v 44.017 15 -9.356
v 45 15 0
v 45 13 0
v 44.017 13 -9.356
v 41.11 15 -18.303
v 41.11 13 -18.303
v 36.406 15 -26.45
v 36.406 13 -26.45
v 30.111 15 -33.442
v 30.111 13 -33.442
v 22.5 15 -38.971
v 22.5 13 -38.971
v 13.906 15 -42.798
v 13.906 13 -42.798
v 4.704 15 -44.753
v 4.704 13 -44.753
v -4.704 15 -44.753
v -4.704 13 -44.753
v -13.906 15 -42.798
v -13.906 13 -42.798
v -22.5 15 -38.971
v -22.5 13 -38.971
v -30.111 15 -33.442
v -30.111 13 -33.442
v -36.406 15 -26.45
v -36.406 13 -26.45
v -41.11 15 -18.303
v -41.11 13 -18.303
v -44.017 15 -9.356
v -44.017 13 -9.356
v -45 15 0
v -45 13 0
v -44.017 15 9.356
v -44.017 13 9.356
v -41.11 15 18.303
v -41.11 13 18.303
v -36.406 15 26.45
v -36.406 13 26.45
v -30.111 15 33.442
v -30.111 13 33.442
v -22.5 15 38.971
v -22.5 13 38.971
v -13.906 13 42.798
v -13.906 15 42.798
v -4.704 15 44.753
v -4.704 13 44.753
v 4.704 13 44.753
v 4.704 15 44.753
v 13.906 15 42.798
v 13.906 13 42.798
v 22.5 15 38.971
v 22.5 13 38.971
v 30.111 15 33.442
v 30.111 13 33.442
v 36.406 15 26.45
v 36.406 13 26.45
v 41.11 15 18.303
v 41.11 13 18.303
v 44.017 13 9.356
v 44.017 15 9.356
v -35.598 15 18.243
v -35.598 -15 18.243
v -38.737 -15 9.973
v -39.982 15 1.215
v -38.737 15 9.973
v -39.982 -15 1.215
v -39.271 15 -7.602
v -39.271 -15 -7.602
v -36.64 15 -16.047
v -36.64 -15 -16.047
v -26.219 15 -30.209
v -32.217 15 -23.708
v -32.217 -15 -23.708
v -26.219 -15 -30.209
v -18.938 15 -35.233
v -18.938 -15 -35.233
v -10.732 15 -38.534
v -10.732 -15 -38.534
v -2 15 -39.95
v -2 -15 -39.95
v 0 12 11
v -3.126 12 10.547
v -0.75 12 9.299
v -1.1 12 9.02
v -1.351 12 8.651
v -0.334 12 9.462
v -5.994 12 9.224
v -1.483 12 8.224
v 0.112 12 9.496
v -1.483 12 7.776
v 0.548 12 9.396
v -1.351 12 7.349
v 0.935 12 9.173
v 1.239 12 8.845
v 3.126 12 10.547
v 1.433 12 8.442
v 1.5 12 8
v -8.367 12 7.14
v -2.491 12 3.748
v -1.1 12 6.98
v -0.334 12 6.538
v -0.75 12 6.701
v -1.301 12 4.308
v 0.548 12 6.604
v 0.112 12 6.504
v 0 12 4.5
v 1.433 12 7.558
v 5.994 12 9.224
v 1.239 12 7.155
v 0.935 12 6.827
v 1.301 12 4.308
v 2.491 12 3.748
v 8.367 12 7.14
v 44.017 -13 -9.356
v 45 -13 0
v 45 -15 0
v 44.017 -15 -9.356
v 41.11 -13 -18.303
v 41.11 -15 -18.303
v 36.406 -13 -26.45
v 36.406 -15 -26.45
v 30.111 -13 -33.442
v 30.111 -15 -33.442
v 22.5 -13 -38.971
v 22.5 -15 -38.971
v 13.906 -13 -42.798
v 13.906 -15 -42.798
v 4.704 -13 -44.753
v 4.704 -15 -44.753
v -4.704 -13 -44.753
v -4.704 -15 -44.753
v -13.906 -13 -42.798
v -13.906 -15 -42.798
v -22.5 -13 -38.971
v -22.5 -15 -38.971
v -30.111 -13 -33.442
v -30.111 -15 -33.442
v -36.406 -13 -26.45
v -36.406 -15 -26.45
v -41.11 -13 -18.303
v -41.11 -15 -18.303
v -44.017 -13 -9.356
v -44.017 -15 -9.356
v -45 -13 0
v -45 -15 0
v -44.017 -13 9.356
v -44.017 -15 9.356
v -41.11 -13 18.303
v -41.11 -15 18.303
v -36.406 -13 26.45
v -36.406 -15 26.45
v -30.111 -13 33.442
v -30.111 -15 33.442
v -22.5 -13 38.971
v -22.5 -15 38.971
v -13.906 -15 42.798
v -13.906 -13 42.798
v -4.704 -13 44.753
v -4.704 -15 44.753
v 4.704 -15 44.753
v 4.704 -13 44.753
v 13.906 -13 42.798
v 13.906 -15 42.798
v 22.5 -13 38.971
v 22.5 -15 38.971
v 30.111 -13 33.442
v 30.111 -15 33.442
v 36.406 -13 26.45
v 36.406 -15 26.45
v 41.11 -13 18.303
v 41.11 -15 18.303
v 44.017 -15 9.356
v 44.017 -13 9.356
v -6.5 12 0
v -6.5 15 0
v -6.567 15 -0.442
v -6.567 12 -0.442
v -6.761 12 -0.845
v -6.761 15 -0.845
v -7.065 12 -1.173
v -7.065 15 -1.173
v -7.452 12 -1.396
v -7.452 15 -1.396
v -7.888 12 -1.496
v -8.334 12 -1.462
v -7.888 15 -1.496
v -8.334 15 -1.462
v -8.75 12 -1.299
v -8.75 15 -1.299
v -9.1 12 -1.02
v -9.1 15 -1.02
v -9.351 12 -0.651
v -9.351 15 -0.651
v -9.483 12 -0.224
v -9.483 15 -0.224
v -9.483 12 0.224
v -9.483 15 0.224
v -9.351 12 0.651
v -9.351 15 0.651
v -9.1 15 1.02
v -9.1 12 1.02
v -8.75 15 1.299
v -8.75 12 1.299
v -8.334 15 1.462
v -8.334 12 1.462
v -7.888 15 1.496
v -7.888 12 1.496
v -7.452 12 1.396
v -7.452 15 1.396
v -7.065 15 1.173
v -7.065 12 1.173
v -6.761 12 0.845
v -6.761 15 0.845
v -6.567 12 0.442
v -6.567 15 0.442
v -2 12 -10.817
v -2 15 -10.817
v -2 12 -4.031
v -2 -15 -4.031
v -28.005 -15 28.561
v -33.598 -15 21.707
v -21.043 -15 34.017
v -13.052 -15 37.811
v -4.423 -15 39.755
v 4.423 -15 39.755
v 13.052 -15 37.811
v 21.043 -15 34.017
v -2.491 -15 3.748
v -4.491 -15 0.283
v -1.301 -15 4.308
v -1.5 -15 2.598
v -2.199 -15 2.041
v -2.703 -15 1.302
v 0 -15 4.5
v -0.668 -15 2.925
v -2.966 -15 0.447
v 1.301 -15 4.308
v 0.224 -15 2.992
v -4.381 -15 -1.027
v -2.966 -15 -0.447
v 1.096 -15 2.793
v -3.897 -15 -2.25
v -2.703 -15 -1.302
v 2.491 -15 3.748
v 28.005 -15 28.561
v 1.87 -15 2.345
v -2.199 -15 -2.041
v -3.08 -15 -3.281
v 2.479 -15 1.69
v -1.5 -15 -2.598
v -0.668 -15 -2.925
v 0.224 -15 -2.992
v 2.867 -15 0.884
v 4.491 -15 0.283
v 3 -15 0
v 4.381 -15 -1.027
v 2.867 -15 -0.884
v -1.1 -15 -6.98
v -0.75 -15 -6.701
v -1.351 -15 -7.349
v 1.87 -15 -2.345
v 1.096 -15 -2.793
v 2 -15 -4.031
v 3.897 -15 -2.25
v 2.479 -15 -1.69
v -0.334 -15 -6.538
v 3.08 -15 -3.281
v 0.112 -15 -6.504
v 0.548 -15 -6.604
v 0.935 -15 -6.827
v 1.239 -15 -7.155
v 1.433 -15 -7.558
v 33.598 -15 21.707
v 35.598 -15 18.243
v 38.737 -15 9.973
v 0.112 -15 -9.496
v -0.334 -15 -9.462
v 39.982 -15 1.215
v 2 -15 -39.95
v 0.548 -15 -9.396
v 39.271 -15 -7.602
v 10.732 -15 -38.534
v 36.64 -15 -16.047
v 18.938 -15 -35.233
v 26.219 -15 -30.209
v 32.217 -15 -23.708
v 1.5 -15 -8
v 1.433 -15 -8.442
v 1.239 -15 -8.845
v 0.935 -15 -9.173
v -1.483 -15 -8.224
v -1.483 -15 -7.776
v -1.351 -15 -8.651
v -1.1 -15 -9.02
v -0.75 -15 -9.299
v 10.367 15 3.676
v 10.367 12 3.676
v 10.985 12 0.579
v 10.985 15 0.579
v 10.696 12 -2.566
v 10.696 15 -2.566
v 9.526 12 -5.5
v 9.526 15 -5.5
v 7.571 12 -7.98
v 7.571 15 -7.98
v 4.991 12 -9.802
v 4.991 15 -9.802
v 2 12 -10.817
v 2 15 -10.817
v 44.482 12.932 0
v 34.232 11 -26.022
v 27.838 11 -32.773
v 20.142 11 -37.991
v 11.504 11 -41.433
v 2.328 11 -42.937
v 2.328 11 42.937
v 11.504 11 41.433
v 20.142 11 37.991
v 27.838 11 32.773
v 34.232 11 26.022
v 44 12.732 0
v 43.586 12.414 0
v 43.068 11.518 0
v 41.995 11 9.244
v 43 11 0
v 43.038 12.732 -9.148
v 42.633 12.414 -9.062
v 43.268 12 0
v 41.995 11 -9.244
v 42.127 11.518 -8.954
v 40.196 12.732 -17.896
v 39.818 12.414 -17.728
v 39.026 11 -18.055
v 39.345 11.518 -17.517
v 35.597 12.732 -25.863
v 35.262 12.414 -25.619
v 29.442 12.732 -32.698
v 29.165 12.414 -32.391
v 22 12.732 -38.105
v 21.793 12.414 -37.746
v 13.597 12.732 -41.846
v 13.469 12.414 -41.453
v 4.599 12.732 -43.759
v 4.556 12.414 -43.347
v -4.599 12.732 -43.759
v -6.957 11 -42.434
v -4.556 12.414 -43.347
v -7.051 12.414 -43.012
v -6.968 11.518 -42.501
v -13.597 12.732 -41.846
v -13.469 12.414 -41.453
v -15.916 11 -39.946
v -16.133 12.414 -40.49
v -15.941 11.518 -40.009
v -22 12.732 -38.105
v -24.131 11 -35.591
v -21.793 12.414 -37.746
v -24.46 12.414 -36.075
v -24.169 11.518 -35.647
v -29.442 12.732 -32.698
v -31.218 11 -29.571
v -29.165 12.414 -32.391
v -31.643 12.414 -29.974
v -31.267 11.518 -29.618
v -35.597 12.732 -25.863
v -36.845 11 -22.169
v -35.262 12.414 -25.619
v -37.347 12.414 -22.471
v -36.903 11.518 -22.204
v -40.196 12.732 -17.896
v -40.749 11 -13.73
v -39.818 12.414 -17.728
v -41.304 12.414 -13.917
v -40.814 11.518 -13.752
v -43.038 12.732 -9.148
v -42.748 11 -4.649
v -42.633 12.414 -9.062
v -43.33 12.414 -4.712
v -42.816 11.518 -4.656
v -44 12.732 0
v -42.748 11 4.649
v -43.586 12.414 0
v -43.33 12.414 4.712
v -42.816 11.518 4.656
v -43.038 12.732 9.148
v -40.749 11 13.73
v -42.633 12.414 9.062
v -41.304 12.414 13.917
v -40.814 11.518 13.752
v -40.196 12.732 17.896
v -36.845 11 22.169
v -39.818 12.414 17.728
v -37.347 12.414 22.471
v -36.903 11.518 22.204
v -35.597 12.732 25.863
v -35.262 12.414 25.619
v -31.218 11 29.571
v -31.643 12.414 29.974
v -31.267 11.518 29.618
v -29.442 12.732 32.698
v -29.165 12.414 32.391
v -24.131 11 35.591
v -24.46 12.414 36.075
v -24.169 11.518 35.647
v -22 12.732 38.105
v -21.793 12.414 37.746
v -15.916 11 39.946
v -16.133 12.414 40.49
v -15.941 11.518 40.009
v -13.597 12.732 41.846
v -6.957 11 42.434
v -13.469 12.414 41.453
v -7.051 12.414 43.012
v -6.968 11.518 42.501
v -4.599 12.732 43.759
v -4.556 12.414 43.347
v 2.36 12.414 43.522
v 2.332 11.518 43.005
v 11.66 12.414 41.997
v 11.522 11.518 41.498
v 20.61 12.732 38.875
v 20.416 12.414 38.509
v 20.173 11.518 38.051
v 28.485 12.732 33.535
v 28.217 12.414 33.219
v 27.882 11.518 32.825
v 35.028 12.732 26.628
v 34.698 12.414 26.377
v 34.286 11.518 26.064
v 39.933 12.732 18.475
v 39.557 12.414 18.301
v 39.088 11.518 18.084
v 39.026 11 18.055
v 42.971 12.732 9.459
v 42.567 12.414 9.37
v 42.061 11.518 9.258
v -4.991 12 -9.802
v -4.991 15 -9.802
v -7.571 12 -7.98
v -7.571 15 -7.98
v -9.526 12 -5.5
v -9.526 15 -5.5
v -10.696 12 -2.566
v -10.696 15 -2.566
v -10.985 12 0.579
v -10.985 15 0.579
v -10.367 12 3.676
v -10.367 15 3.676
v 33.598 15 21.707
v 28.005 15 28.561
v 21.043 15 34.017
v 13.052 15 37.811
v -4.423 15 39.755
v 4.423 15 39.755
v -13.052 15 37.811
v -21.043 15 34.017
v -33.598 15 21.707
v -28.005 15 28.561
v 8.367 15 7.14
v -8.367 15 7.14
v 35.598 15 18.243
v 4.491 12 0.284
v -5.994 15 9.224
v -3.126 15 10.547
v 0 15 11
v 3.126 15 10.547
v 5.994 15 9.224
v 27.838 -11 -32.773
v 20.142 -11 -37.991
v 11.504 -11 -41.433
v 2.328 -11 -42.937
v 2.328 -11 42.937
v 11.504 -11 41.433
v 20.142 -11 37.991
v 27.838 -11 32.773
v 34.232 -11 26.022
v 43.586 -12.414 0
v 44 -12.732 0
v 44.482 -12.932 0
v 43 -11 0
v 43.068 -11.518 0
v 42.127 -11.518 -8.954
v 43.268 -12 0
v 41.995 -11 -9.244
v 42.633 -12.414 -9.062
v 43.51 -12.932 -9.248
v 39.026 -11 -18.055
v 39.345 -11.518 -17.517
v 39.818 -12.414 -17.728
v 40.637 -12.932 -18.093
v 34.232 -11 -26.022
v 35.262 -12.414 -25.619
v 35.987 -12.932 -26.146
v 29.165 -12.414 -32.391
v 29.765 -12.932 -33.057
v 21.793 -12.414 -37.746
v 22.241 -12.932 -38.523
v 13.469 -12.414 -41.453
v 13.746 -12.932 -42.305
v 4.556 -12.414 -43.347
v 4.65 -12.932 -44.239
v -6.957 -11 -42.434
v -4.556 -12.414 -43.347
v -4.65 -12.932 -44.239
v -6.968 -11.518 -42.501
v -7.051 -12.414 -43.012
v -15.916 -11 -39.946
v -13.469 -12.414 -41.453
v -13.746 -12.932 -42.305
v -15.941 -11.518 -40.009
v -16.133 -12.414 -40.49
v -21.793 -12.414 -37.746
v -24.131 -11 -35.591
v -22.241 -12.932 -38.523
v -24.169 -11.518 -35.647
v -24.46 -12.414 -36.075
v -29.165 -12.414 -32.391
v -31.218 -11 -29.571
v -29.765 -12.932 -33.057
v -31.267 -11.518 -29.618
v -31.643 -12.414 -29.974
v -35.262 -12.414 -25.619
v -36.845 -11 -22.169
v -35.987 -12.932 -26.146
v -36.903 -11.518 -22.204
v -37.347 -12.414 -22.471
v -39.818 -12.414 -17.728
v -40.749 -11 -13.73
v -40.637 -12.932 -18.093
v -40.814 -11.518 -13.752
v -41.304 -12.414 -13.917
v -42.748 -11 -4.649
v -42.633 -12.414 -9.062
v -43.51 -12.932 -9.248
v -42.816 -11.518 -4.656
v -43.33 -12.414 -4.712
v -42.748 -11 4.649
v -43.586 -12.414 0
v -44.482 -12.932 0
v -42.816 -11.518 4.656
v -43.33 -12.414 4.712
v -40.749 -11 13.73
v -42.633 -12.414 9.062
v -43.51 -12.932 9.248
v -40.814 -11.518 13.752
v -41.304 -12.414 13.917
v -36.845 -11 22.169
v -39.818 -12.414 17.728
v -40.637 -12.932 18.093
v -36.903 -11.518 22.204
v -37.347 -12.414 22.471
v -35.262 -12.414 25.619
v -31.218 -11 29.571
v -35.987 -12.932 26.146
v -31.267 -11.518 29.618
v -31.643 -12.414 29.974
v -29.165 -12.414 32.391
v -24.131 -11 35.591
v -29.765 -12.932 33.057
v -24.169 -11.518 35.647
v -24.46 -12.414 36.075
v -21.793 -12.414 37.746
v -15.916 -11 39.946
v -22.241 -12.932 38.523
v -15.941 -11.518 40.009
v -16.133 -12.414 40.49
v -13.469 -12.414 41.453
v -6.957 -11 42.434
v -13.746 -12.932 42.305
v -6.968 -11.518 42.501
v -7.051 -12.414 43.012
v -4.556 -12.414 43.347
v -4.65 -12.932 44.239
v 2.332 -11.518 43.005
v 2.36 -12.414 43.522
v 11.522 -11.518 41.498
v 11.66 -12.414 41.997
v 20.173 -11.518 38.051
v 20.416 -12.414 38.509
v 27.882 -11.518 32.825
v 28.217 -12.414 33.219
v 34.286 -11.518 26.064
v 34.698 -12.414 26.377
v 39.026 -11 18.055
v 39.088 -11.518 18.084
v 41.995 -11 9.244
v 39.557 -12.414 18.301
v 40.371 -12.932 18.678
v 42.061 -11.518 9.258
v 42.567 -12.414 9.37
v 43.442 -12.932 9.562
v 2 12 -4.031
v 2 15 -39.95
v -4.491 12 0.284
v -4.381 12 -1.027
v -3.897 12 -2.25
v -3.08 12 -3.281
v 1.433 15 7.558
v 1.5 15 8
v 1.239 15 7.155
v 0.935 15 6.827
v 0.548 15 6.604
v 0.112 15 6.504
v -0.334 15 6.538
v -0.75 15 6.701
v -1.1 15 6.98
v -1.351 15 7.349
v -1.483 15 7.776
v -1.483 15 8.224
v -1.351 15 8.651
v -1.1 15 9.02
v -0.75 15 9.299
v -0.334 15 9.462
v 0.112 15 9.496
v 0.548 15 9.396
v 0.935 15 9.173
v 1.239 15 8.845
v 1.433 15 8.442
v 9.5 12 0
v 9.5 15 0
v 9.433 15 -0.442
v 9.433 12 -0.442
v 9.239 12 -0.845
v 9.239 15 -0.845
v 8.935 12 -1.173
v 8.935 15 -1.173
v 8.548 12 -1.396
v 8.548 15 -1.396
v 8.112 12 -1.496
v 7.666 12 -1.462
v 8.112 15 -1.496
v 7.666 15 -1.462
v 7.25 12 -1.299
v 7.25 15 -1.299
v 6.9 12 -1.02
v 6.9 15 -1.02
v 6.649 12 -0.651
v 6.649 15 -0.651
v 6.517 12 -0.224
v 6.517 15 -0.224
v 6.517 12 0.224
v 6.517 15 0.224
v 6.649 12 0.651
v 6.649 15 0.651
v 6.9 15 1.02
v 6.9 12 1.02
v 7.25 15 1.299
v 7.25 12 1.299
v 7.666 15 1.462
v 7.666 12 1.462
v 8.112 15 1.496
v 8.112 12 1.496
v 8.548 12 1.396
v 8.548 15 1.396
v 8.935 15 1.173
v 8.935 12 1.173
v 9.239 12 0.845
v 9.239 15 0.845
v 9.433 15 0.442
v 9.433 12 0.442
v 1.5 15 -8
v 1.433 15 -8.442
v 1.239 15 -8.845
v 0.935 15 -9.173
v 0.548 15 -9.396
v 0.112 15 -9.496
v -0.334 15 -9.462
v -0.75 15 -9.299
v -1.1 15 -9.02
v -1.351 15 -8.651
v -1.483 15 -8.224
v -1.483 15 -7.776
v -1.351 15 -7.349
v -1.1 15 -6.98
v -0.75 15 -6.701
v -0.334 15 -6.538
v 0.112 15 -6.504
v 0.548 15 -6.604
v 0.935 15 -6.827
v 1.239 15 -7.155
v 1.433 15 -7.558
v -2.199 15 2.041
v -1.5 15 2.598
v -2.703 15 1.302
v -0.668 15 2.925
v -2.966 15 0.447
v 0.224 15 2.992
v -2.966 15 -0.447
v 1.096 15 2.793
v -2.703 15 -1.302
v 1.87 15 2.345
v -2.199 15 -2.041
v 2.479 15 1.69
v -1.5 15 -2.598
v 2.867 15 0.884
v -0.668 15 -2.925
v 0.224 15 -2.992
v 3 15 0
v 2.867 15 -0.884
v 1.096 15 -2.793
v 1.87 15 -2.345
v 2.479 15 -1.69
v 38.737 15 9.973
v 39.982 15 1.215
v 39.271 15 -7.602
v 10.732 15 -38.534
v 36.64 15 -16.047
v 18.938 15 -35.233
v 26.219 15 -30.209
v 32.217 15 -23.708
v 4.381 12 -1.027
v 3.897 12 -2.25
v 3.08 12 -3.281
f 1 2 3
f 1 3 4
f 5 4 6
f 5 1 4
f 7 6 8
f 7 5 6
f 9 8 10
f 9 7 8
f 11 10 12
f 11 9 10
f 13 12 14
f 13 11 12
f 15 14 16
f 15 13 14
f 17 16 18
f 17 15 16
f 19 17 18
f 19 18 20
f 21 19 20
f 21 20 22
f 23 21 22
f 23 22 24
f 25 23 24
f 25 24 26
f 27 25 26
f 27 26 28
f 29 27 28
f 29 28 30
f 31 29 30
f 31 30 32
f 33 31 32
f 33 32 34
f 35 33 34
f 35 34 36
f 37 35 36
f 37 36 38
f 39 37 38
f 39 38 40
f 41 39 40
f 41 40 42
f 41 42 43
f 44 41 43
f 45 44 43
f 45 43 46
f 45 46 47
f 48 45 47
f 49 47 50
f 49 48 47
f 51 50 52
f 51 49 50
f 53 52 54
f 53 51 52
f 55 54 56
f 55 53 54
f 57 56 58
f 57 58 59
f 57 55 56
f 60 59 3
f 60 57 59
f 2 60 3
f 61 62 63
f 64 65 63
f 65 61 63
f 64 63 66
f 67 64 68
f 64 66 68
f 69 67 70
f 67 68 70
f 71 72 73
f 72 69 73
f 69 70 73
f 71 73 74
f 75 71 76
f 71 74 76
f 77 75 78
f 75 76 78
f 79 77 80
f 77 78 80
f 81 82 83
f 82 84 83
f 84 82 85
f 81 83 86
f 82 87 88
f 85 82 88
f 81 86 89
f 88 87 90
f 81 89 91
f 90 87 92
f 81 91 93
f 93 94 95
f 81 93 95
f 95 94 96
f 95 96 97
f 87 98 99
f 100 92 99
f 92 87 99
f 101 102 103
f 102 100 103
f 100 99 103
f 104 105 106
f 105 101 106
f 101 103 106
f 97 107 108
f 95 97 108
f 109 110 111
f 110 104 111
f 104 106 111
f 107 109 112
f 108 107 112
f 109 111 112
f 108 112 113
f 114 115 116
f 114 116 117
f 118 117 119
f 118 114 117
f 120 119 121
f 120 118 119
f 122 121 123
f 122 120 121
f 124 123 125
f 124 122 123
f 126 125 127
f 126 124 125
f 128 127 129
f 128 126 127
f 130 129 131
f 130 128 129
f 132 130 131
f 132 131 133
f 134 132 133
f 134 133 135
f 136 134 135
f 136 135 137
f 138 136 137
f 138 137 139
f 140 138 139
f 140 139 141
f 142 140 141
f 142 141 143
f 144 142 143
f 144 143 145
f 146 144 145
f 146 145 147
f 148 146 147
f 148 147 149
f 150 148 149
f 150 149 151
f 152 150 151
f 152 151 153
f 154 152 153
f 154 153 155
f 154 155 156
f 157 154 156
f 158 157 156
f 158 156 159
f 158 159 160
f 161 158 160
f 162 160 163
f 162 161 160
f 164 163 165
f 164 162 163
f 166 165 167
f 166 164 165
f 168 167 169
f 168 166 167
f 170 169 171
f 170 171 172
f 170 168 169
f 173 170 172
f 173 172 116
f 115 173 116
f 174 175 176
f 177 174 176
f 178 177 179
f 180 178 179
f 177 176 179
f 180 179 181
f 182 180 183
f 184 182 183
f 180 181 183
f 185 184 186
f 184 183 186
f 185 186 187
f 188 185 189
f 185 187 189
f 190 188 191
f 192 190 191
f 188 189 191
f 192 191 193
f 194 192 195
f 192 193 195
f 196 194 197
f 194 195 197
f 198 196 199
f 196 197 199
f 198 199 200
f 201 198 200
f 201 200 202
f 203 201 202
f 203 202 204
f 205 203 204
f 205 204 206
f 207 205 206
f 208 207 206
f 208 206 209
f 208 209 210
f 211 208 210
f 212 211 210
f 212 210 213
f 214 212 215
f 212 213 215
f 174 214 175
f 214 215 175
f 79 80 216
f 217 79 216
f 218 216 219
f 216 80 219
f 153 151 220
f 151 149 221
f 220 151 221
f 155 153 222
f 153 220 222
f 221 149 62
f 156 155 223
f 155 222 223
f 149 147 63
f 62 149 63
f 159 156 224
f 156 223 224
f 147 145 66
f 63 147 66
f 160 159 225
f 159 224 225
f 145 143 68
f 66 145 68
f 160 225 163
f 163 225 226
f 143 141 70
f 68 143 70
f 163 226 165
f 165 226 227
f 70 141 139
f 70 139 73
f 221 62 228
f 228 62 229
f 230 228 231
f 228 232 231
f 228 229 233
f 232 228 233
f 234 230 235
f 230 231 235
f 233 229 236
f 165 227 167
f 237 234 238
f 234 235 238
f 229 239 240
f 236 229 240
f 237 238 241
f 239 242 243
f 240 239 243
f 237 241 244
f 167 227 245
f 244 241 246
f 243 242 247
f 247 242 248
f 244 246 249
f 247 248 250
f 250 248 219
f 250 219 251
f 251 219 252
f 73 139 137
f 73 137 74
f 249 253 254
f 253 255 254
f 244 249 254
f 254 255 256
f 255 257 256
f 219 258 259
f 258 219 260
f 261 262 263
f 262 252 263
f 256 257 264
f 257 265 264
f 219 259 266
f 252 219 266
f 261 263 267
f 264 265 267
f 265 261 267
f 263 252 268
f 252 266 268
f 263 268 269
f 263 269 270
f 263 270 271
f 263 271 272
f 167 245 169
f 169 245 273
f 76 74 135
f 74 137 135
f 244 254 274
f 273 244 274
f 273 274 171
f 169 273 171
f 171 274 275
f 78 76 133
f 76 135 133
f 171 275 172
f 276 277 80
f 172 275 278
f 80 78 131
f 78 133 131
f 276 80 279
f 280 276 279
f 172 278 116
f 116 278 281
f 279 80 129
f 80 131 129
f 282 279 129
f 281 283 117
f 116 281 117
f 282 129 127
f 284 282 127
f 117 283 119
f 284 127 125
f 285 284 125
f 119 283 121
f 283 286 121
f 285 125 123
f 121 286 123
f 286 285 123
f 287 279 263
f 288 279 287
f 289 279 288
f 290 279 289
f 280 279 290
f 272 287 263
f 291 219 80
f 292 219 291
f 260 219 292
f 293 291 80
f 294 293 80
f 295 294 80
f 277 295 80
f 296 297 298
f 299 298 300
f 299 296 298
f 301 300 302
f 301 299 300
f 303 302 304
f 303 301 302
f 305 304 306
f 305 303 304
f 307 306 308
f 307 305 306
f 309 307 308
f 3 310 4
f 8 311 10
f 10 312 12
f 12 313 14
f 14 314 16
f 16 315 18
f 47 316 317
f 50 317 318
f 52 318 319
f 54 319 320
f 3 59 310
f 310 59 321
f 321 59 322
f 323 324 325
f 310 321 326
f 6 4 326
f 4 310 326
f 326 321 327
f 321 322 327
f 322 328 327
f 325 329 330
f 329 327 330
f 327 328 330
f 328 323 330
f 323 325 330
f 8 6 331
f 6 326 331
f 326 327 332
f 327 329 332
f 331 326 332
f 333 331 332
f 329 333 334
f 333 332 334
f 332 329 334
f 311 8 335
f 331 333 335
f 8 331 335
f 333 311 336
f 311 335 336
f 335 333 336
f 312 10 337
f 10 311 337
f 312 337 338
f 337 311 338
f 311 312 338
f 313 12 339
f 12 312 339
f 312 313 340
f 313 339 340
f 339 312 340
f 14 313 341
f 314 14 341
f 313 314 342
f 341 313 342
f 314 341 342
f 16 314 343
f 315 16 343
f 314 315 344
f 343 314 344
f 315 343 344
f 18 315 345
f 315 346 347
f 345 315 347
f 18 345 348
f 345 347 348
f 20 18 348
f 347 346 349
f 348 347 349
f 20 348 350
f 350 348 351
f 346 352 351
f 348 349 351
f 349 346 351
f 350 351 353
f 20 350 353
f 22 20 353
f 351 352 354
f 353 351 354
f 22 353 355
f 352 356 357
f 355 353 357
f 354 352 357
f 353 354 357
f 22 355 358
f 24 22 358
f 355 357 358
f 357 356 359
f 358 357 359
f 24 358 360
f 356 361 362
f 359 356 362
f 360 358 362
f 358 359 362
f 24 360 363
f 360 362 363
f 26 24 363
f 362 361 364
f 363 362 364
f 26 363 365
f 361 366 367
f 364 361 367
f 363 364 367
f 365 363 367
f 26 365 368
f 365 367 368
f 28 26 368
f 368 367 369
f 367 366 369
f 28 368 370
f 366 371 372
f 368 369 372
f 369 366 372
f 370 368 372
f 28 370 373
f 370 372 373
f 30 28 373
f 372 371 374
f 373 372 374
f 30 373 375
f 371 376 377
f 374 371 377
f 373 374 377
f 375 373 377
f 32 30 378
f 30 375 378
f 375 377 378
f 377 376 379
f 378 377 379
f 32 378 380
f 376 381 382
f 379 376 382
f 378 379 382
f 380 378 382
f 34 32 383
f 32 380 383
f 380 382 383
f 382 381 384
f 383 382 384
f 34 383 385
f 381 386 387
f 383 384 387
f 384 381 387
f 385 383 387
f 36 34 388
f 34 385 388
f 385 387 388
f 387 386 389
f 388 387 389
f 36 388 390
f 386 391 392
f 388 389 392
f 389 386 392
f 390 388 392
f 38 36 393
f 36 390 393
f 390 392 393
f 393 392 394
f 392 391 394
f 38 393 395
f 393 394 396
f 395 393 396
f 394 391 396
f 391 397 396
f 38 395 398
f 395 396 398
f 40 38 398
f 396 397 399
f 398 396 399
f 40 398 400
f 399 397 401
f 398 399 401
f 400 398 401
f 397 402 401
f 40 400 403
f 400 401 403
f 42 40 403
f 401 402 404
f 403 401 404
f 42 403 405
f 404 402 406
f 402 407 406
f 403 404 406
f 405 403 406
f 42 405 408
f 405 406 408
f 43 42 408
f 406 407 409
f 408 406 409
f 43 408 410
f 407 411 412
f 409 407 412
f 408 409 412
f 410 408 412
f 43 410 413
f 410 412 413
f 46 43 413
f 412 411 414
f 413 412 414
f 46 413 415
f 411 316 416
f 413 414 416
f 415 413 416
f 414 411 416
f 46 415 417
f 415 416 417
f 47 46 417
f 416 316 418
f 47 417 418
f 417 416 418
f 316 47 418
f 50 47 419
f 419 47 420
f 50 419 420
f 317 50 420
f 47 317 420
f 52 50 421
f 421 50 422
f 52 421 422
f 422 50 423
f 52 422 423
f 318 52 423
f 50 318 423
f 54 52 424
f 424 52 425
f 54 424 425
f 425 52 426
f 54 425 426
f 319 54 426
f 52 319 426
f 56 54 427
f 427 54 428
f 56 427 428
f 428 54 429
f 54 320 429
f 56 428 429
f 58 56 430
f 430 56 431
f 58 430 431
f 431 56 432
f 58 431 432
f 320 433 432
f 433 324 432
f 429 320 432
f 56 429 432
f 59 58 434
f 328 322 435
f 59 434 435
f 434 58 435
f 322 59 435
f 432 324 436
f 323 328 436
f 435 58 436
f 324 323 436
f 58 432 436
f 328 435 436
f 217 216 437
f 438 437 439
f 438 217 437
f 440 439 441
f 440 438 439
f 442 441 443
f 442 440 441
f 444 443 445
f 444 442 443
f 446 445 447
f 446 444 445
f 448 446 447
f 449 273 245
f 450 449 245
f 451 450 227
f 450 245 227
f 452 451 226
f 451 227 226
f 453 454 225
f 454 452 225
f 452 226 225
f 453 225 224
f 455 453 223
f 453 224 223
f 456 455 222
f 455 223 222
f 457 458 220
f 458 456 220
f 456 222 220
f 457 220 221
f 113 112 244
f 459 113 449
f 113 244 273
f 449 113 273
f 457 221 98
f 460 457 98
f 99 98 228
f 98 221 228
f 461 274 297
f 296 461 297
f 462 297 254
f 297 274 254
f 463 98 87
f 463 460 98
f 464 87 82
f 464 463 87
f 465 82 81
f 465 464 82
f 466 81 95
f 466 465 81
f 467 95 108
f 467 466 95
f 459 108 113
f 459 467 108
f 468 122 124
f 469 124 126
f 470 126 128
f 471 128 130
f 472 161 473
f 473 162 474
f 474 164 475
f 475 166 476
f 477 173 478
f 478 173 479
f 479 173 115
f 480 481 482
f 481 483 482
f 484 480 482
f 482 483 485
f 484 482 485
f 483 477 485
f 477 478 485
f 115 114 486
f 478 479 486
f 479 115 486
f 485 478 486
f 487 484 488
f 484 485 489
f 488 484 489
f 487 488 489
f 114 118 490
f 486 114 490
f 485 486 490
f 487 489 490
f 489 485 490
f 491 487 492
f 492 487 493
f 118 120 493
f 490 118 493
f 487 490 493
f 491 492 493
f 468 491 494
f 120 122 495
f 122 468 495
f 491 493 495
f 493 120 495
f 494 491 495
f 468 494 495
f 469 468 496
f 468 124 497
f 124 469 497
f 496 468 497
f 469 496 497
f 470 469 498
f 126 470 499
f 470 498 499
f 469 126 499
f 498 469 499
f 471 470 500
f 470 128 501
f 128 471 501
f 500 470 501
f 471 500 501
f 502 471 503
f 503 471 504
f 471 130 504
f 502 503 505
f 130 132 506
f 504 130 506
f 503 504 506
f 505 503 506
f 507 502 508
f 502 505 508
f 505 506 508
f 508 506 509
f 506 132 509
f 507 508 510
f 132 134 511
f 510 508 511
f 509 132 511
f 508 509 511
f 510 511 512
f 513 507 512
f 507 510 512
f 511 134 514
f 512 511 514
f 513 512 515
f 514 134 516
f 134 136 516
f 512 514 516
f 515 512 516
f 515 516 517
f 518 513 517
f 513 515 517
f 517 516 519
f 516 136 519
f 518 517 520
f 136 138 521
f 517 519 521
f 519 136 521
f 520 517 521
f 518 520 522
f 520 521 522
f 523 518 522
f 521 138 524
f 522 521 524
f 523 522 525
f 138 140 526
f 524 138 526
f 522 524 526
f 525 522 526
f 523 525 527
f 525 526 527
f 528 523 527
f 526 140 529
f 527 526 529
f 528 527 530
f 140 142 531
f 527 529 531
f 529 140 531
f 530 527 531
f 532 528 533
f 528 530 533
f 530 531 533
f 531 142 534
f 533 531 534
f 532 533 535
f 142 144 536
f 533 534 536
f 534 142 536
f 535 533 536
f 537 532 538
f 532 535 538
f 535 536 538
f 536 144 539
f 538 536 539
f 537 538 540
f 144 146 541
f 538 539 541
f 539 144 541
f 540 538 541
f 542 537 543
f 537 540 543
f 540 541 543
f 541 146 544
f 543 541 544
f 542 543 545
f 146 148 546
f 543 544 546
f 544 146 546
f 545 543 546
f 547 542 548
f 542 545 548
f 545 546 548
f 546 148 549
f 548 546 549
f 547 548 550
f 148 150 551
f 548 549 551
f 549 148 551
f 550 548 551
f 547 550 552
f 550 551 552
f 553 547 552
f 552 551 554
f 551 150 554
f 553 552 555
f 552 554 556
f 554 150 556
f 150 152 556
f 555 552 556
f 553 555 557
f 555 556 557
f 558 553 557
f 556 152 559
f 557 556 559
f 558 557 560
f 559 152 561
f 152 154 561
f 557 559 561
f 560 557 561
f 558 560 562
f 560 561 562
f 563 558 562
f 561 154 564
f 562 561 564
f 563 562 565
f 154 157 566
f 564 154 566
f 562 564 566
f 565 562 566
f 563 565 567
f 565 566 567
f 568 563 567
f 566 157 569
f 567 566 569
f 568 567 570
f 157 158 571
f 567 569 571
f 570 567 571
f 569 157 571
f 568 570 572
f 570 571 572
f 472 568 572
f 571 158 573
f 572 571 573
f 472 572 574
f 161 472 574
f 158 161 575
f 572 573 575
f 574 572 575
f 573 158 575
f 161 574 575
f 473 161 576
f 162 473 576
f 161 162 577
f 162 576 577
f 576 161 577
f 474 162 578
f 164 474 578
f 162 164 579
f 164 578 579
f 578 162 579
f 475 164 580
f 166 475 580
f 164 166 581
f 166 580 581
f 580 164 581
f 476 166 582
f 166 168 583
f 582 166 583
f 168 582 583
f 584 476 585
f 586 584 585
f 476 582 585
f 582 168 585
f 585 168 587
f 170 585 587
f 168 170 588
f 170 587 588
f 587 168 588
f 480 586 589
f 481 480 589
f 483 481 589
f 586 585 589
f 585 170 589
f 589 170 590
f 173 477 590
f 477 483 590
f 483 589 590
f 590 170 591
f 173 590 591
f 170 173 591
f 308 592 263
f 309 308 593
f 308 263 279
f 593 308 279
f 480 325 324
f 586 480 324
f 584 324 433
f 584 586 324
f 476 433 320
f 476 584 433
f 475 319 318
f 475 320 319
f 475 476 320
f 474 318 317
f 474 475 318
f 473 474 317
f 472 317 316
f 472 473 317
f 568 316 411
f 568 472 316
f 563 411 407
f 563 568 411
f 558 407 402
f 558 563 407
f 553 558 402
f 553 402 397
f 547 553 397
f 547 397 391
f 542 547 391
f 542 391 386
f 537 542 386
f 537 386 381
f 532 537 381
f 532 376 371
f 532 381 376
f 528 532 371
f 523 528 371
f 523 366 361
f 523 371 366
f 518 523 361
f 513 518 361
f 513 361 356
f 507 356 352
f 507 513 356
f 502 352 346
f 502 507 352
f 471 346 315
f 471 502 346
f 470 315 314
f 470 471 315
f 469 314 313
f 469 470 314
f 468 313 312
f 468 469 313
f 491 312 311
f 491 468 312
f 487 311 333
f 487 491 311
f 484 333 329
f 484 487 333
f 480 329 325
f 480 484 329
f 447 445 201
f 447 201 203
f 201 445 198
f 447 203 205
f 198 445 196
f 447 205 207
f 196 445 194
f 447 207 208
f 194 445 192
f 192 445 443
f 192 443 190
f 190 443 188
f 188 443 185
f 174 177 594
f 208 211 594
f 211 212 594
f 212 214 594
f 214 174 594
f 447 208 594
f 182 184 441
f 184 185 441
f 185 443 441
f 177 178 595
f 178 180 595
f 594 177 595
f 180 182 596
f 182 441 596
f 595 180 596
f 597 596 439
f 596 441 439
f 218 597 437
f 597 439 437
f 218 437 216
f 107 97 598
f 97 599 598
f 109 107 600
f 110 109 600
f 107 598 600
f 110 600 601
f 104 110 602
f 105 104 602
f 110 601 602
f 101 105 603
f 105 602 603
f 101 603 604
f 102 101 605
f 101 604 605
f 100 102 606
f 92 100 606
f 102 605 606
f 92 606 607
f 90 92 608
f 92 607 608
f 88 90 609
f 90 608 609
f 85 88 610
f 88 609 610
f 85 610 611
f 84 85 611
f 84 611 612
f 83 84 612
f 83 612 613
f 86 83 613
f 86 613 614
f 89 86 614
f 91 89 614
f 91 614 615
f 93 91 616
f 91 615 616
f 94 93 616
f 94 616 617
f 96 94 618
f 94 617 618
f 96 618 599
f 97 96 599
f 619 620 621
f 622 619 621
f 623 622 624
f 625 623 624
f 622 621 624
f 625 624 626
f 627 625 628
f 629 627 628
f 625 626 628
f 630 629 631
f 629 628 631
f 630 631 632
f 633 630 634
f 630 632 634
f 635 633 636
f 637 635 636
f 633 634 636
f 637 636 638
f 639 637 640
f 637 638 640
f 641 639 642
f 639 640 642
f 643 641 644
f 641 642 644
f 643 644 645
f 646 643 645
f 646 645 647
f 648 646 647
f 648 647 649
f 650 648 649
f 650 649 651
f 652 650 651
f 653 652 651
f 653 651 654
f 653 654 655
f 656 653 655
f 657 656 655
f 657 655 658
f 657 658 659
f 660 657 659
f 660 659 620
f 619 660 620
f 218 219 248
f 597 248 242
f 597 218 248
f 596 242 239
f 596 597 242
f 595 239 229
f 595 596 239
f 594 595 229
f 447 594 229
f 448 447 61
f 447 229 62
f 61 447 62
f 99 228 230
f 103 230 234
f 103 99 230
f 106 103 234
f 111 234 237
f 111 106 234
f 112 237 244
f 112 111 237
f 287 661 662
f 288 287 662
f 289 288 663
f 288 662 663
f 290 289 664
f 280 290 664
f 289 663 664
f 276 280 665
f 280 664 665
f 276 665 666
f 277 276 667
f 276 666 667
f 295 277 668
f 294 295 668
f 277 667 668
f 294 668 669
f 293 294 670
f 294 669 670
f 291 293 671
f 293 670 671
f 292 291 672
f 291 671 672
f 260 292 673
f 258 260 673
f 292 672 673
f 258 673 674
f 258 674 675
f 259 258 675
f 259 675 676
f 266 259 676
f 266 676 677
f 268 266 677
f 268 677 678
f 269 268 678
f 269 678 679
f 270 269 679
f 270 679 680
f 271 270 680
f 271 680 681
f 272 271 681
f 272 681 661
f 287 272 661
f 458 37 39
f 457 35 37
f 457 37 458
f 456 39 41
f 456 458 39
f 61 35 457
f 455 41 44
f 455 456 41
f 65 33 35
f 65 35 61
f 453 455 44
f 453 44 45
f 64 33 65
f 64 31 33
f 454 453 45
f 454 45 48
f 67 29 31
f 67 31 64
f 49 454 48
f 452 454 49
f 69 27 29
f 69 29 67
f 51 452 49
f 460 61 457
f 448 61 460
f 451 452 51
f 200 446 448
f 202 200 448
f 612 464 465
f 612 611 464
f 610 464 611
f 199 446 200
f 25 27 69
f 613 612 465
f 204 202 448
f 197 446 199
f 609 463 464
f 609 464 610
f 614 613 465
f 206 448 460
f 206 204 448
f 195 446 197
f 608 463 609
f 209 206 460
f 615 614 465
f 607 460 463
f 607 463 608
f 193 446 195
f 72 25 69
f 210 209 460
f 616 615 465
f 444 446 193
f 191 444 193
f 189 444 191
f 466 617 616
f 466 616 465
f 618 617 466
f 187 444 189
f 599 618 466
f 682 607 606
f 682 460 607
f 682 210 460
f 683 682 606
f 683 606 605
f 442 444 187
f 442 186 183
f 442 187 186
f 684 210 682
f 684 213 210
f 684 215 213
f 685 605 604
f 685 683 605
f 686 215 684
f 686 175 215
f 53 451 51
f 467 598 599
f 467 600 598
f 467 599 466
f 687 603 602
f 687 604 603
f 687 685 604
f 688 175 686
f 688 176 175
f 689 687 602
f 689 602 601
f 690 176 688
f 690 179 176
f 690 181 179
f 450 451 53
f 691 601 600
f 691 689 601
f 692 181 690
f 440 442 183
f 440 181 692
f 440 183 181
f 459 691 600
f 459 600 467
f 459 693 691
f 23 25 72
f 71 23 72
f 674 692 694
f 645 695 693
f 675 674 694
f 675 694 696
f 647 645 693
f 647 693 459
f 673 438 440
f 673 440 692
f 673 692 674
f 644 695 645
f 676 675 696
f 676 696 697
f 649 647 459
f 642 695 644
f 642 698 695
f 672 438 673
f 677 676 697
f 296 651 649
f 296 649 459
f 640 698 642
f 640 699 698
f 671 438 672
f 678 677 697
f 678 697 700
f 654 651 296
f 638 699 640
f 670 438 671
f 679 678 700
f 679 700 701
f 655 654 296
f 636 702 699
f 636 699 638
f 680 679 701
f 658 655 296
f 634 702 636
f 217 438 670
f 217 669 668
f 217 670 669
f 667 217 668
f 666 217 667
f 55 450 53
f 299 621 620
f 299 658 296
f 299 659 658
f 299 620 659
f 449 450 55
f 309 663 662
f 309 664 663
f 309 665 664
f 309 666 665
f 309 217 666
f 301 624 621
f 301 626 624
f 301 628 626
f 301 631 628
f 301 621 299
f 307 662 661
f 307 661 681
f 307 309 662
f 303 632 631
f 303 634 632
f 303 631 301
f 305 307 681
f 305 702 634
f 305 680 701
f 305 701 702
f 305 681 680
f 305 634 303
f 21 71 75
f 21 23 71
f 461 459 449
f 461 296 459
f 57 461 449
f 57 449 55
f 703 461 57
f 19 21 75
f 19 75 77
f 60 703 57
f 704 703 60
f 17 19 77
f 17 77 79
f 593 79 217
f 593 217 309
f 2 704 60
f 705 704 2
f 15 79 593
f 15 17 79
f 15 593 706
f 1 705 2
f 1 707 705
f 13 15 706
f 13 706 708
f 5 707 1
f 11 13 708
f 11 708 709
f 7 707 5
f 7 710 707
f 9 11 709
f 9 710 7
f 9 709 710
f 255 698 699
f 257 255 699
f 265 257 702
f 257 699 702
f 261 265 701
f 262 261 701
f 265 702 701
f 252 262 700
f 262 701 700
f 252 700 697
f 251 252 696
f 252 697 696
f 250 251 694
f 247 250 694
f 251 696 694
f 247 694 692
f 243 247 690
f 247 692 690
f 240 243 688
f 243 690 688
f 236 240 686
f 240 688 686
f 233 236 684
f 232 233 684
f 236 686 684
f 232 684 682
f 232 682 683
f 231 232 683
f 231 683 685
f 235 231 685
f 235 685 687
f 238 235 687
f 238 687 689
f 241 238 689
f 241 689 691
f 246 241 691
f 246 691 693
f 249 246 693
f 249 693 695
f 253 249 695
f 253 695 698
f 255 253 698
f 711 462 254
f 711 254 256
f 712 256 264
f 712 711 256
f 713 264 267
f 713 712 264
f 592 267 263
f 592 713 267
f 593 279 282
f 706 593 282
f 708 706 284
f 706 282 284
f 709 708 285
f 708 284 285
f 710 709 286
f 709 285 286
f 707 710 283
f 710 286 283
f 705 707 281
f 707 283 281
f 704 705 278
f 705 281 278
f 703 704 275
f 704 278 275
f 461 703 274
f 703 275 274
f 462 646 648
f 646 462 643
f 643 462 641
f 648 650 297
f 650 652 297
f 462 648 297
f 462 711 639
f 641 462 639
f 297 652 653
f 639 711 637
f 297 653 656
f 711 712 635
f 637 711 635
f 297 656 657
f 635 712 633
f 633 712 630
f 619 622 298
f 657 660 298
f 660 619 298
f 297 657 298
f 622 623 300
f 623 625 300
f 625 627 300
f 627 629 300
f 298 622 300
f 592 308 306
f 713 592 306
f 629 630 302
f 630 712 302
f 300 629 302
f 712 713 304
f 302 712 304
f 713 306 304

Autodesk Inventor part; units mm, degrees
ref_plane "YZ Plane" through (0, 0, 0) normal (1, 0, 0) x (0, 1, 0)
ref_plane "XZ Plane" through (0, 0, 0) normal (0, 1, 0) x (-1, 0, 0)
ref_plane "XY Plane" through (0, 0, 0) normal (0, 0, 1) x (1, 0, 0)
sketch "Эскиз1" plane through (0, 0, 0) normal (0, 0, 1) x (1, 0, 0)
  line L0 (0, 0) -> (40, 0)
  line L1 (0, 0) -> (0, 10)
  line L2 (40, 0) -> (40, -15) construction
  line L3 (40, -15) -> (45, -15)
  line L4 (45, 15) -> (40, 15)
  line L5 (40, 15) -> (40, -15)
  line L6 (40, 15) -> (40, 13) construction
  line L7 (40, 13) -> (45, 13) construction
  line L8 (40, -15) -> (40, -13) construction
  line L9 (40, -13) -> (45, -13) construction
  line L10 (45, -13) -> (45, -11) construction
  line L11 (45, -11) -> (45, -9) construction
  arc A0 (43, -11) -> (45, -13) centre (45, -11) ccw
  arc A1 (45, 13) -> (43, 11) centre (45, 11) ccw
  line L12 (43, 11) -> (43, -11)
  line L13 (45, -15) -> (45, -13)
  line L14 (45, 13) -> (45, 15)
  dimension "d0" = 40
  dimension "d1" = 10
  dimension "d2" = 15
  dimension "d3" = 5
  dimension "d4" = 30
  dimension "d5" = 2
  dimension "d6" = 2
revolve "Вращение1" add sketch "Эскиз1" angle 360 about axis through (0, 0, 0) along (0, 1, 0)
sketch "Эскиз7" plane through (0, 15, 0) normal (0, 1, 0) x (1, 0, 0)
  circle A0 centre (0, 0) radius 11
  dimension "d29" = 22
extrude "Выдавливание5" add sketch "Эскиз7" against normal blind 3
sketch "Эскиз8" plane through (0, 15, 0) normal (0, 1, 0) x (1, 0, 0)
  circle A0 centre (0, 0) radius 3
  circle A1 centre (0, 0) radius 4.5
  dimension "d32" = 6
  dimension "d33" = 9
extrude "Выдавливание6" cut sketch "Эскиз8" against normal blind 3 contours A0
extrude "Выдавливание7" add sketch "Эскиз8" against normal up to surface (30 mm away)
sketch "Эскиз10" plane through (0, 15, 0) normal (0, 1, 0) x (1, 0, 0)
  line L0 (0, 0) -> (8, 0) construction
  circle A0 centre (8, 0) radius 1.5
  circle A1 centre (0, 0) radius 3 construction
  circle A2 centre (0, 8) radius 1.5
  circle A3 centre (-8, 0) radius 1.5
  circle A4 centre (0, -8) radius 1.5
  dimension "d38" = 8
  dimension "d39" = 3
  dimension "d42" = 360
extrude "Выдавливание8" cut sketch "Эскиз10" against normal blind 3
sketch "Эскиз11" plane through (0, -15, 0) normal (0, -1, 0) x (1, 0, 0)
  circle A0 centre (0, 0) radius 3 projected
  circle A1 centre (0, 0) radius 4.5 projected
  circle A2 centre (0, 0) radius 45 projected
  circle A3 centre (0, 0) radius 40 projected
  line L0 (0, -4.5) -> (0, -40) construction
  circle A4 centre (0, 0) radius 40 construction
  line L1 (-2, -39.95) -> (-2, -4.0311)
  line L2 (2, -4.0311) -> (2, -39.95)
  line L3 (1.8638, -39.9566) -> (-1.9134, -4.073) construction
  line L4 (-1.8638, -39.9566) -> (1.9134, -4.073) construction
  circle A5 centre (0, -8) radius 1.5 projected
  arc A6 (-2, -39.95) -> (2, -39.95) centre (0, 0) ccw
  arc A7 (-2, -4.0311) -> (1.9134, -4.073) centre (0, 0) ccw
  point P0 (0, -22.25)
extrude "Выдавливание9" add sketch "Эскиз11" against normal up to surface (30 mm away) contours A1 L2 A3 L1 | A5 picked at (0.0603, -29.826)
pattern_circular "Круговой массив1" count 3 over 360 about axis through (0, 15, 0) along (0, -1, 0) of "Выдавливание9"
sketch "Эскиз12" plane through (0, 15, 0) normal (0, 1, 0) x (1, 0, 0)
  circle A0 centre (8, 0) radius 1.5 projected
  circle A1 centre (0, 0) radius 3 projected
  circle A2 centre (8, 0) radius 1.5
  circle A3 centre (0, 8) radius 1.5
  circle A4 centre (-8, 0) radius 1.5
  circle A5 centre (0, -8) radius 1.5
  dimension "d55" = 360
extrude "Выдавливание10" cut sketch "Эскиз12" against normal up to next contours A3
properties part number "Wheel"
